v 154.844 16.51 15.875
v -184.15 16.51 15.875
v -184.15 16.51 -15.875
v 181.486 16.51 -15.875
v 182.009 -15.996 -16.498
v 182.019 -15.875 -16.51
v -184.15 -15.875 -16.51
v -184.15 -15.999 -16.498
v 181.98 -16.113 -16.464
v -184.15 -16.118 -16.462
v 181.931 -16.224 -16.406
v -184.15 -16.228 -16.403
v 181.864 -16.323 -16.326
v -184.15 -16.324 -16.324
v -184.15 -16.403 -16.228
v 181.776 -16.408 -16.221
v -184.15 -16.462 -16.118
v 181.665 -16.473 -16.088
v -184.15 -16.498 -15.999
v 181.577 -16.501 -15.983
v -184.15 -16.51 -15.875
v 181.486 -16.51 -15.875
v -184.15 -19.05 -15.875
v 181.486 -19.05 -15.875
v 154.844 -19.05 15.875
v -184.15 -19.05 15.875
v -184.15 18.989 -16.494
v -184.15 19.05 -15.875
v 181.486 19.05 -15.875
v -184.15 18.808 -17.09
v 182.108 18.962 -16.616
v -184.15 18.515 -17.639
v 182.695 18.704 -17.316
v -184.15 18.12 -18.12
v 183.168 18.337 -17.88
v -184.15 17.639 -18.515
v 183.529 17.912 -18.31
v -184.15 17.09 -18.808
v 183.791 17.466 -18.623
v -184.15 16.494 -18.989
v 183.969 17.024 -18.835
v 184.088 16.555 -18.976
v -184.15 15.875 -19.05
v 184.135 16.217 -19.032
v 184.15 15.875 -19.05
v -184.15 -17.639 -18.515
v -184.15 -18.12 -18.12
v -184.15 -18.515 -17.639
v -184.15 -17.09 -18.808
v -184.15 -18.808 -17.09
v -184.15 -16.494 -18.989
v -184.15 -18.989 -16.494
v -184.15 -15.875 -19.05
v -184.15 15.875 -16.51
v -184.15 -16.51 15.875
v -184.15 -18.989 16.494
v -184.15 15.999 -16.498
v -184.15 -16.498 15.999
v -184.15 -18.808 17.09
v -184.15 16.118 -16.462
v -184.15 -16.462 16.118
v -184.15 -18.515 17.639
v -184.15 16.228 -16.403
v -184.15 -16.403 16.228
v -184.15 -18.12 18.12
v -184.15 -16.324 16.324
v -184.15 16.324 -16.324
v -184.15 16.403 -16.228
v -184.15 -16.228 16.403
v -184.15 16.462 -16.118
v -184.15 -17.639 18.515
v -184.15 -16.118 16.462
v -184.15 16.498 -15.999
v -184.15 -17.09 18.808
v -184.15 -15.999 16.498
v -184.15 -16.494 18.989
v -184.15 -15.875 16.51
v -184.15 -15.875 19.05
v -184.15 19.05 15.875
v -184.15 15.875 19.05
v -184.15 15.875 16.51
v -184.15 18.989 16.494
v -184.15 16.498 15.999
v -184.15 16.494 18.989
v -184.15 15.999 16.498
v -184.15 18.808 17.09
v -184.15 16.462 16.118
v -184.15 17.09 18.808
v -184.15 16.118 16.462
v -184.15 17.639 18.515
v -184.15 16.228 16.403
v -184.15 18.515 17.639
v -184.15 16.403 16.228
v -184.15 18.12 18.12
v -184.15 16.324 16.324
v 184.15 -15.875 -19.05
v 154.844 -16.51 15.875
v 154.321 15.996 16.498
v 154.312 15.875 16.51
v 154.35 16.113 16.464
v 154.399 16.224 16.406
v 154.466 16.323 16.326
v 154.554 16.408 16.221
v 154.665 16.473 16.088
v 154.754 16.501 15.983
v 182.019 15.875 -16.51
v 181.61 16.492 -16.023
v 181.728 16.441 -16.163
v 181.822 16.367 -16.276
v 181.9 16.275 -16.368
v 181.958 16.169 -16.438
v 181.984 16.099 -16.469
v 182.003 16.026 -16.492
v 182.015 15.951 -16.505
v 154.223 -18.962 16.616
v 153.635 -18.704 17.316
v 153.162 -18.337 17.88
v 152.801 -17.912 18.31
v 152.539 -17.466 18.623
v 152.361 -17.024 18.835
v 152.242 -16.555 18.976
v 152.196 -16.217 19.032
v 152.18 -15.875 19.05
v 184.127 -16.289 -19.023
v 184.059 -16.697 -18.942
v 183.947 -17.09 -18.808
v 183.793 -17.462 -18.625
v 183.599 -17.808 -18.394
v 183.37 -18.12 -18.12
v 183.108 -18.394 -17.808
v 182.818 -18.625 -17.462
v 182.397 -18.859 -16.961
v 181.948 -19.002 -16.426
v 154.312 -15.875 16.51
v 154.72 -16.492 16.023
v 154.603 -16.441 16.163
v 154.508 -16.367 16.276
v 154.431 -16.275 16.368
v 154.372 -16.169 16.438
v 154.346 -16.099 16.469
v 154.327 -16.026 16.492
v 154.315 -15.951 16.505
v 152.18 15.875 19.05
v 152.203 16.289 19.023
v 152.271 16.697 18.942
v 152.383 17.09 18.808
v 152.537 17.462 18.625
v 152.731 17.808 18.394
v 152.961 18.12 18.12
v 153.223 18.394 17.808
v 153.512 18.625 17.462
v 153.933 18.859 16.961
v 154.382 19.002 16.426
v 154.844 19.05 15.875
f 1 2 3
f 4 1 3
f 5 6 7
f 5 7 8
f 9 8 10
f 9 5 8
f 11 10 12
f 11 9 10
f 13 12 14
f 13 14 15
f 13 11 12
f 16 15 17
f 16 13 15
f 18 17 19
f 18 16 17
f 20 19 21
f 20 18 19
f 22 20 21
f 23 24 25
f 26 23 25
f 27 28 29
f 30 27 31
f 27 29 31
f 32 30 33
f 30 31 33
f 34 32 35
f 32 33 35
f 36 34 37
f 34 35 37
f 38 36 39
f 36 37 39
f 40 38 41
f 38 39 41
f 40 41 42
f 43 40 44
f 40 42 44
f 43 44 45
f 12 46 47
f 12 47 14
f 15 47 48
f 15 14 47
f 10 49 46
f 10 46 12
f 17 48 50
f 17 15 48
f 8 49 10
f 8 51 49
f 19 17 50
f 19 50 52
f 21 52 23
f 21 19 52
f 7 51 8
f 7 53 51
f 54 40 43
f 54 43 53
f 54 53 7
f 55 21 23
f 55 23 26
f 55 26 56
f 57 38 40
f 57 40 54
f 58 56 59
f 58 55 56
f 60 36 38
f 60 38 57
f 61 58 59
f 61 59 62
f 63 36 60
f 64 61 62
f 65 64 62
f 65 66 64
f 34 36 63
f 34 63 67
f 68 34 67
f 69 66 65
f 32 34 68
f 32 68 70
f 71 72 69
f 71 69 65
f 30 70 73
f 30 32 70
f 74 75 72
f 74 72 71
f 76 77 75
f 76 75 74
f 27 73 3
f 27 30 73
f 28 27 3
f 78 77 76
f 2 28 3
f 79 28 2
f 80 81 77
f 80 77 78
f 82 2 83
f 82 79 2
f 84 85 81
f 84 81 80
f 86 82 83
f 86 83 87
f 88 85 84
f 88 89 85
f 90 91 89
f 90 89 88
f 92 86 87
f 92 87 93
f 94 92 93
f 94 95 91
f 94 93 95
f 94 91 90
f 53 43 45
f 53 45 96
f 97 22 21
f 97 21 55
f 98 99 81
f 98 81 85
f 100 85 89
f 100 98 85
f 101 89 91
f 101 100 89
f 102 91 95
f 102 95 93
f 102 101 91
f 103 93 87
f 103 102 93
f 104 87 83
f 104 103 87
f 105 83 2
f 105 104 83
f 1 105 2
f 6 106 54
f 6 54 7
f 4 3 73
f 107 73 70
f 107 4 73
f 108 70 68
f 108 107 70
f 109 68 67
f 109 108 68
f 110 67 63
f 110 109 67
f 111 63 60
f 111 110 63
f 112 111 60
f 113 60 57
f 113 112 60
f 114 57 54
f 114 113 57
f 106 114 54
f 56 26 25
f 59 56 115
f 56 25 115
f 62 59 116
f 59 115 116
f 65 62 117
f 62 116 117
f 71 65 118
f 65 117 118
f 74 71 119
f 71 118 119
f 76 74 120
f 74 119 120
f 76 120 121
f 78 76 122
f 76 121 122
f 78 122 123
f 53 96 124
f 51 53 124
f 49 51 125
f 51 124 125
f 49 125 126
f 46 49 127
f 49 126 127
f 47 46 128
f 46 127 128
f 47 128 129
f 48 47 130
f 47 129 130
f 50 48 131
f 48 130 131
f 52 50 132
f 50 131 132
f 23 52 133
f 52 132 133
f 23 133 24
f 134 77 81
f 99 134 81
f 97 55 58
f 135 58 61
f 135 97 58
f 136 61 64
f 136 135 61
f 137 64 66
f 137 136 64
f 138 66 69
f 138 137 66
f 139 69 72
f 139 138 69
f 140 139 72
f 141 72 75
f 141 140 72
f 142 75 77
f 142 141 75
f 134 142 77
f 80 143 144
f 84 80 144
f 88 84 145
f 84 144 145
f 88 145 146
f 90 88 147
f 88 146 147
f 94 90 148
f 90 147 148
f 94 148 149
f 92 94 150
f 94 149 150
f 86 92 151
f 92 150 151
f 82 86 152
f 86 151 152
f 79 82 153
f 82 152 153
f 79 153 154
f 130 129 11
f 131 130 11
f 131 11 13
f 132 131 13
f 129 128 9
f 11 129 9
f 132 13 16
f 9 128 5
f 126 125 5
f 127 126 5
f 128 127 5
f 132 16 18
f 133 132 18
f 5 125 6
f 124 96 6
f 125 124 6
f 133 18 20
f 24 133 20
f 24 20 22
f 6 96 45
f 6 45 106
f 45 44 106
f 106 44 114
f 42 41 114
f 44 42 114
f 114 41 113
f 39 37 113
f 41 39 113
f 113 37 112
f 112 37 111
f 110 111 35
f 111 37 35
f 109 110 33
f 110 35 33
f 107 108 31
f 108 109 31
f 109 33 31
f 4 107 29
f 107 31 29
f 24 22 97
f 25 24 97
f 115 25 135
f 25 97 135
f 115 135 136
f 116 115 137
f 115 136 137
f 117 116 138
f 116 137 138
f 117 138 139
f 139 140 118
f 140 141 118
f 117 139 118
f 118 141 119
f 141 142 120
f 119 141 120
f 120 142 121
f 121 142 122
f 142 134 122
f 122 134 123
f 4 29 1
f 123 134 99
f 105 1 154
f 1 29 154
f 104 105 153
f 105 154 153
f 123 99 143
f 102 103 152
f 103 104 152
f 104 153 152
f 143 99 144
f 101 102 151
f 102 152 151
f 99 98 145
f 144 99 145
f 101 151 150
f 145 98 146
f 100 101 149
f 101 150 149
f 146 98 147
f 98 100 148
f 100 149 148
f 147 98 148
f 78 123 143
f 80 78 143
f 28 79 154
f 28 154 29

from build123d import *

# Parameters (mm, degrees)
EXTRUDE_THIN1_DEPTH     = 184.15
CUT_EXTRUDE1_DEPTH      = 1
CUT_EXTRUDE1_DEPTH_BACK = 39.1


with BuildPart() as part:
    # Sketch1 → Extrude-Thin1 (new body, symmetric)
    with BuildSketch(Plane(origin=(0, 0, 0), x_dir=(0, 0, -1), z_dir=(1, 0, 0))):
        with BuildLine():
            Line((-15.875, 19.05), (15.875, 19.05))
            ThreePointArc((15.875, 19.05), (18.12006403, 18.12006403), (19.05, 15.875))
            Line((19.05, 15.875), (19.05, -15.875))
            ThreePointArc((19.05, -15.875), (18.12006403, -18.12006403), (15.875, -19.05))
            Line((15.875, -19.05), (-15.875, -19.05))
            ThreePointArc((-15.875, -19.05), (-18.12006403, -18.12006403), (-19.05, -15.875))
            Line((-19.05, -15.875), (-19.05, 15.875))
            ThreePointArc((-19.05, 15.875), (-18.12006403, 18.12006403), (-15.875, 19.05))
        make_face()
        with BuildLine():
            Line((-15.875, 16.51), (15.875, 16.51))
            ThreePointArc((15.875, 16.51), (16.324012806, 16.324012806), (16.51, 15.875))
            Line((16.51, 15.875), (16.51, -15.875))
            ThreePointArc((16.51, -15.875), (16.324012806, -16.324012806), (15.875, -16.51))
            Line((15.875, -16.51), (-15.875, -16.51))
            ThreePointArc((-15.875, -16.51), (-16.324012806, -16.324012806), (-16.51, -15.875))
            Line((-16.51, -15.875), (-16.51, 15.875))
            ThreePointArc((-16.51, 15.875), (-16.324012806, 16.324012806), (-15.875, 16.51))
        make_face(mode=Mode.SUBTRACT)
    extrude(amount=EXTRUDE_THIN1_DEPTH, both=True)

    # Sketch3 → Cut-Extrude1 (cut, two sides)
    with BuildSketch(Plane(origin=(0, 19.05, 0), x_dir=(1, 0, 0), z_dir=(0, 1, 0))) as cut_extrude1_sk:
        Polygon((666.581957194, 593.990018168), (184.15, 19.05), (152.180304052, -19.05), (-330.251653142, -593.990018168), (819.628383194, -1558.853932556), (1816.46199353, -370.87389622), align=None)
    extrude(amount=CUT_EXTRUDE1_DEPTH, mode=Mode.SUBTRACT)
    extrude(cut_extrude1_sk.sketch, amount=-CUT_EXTRUDE1_DEPTH_BACK, mode=Mode.SUBTRACT)


solid = part.part
